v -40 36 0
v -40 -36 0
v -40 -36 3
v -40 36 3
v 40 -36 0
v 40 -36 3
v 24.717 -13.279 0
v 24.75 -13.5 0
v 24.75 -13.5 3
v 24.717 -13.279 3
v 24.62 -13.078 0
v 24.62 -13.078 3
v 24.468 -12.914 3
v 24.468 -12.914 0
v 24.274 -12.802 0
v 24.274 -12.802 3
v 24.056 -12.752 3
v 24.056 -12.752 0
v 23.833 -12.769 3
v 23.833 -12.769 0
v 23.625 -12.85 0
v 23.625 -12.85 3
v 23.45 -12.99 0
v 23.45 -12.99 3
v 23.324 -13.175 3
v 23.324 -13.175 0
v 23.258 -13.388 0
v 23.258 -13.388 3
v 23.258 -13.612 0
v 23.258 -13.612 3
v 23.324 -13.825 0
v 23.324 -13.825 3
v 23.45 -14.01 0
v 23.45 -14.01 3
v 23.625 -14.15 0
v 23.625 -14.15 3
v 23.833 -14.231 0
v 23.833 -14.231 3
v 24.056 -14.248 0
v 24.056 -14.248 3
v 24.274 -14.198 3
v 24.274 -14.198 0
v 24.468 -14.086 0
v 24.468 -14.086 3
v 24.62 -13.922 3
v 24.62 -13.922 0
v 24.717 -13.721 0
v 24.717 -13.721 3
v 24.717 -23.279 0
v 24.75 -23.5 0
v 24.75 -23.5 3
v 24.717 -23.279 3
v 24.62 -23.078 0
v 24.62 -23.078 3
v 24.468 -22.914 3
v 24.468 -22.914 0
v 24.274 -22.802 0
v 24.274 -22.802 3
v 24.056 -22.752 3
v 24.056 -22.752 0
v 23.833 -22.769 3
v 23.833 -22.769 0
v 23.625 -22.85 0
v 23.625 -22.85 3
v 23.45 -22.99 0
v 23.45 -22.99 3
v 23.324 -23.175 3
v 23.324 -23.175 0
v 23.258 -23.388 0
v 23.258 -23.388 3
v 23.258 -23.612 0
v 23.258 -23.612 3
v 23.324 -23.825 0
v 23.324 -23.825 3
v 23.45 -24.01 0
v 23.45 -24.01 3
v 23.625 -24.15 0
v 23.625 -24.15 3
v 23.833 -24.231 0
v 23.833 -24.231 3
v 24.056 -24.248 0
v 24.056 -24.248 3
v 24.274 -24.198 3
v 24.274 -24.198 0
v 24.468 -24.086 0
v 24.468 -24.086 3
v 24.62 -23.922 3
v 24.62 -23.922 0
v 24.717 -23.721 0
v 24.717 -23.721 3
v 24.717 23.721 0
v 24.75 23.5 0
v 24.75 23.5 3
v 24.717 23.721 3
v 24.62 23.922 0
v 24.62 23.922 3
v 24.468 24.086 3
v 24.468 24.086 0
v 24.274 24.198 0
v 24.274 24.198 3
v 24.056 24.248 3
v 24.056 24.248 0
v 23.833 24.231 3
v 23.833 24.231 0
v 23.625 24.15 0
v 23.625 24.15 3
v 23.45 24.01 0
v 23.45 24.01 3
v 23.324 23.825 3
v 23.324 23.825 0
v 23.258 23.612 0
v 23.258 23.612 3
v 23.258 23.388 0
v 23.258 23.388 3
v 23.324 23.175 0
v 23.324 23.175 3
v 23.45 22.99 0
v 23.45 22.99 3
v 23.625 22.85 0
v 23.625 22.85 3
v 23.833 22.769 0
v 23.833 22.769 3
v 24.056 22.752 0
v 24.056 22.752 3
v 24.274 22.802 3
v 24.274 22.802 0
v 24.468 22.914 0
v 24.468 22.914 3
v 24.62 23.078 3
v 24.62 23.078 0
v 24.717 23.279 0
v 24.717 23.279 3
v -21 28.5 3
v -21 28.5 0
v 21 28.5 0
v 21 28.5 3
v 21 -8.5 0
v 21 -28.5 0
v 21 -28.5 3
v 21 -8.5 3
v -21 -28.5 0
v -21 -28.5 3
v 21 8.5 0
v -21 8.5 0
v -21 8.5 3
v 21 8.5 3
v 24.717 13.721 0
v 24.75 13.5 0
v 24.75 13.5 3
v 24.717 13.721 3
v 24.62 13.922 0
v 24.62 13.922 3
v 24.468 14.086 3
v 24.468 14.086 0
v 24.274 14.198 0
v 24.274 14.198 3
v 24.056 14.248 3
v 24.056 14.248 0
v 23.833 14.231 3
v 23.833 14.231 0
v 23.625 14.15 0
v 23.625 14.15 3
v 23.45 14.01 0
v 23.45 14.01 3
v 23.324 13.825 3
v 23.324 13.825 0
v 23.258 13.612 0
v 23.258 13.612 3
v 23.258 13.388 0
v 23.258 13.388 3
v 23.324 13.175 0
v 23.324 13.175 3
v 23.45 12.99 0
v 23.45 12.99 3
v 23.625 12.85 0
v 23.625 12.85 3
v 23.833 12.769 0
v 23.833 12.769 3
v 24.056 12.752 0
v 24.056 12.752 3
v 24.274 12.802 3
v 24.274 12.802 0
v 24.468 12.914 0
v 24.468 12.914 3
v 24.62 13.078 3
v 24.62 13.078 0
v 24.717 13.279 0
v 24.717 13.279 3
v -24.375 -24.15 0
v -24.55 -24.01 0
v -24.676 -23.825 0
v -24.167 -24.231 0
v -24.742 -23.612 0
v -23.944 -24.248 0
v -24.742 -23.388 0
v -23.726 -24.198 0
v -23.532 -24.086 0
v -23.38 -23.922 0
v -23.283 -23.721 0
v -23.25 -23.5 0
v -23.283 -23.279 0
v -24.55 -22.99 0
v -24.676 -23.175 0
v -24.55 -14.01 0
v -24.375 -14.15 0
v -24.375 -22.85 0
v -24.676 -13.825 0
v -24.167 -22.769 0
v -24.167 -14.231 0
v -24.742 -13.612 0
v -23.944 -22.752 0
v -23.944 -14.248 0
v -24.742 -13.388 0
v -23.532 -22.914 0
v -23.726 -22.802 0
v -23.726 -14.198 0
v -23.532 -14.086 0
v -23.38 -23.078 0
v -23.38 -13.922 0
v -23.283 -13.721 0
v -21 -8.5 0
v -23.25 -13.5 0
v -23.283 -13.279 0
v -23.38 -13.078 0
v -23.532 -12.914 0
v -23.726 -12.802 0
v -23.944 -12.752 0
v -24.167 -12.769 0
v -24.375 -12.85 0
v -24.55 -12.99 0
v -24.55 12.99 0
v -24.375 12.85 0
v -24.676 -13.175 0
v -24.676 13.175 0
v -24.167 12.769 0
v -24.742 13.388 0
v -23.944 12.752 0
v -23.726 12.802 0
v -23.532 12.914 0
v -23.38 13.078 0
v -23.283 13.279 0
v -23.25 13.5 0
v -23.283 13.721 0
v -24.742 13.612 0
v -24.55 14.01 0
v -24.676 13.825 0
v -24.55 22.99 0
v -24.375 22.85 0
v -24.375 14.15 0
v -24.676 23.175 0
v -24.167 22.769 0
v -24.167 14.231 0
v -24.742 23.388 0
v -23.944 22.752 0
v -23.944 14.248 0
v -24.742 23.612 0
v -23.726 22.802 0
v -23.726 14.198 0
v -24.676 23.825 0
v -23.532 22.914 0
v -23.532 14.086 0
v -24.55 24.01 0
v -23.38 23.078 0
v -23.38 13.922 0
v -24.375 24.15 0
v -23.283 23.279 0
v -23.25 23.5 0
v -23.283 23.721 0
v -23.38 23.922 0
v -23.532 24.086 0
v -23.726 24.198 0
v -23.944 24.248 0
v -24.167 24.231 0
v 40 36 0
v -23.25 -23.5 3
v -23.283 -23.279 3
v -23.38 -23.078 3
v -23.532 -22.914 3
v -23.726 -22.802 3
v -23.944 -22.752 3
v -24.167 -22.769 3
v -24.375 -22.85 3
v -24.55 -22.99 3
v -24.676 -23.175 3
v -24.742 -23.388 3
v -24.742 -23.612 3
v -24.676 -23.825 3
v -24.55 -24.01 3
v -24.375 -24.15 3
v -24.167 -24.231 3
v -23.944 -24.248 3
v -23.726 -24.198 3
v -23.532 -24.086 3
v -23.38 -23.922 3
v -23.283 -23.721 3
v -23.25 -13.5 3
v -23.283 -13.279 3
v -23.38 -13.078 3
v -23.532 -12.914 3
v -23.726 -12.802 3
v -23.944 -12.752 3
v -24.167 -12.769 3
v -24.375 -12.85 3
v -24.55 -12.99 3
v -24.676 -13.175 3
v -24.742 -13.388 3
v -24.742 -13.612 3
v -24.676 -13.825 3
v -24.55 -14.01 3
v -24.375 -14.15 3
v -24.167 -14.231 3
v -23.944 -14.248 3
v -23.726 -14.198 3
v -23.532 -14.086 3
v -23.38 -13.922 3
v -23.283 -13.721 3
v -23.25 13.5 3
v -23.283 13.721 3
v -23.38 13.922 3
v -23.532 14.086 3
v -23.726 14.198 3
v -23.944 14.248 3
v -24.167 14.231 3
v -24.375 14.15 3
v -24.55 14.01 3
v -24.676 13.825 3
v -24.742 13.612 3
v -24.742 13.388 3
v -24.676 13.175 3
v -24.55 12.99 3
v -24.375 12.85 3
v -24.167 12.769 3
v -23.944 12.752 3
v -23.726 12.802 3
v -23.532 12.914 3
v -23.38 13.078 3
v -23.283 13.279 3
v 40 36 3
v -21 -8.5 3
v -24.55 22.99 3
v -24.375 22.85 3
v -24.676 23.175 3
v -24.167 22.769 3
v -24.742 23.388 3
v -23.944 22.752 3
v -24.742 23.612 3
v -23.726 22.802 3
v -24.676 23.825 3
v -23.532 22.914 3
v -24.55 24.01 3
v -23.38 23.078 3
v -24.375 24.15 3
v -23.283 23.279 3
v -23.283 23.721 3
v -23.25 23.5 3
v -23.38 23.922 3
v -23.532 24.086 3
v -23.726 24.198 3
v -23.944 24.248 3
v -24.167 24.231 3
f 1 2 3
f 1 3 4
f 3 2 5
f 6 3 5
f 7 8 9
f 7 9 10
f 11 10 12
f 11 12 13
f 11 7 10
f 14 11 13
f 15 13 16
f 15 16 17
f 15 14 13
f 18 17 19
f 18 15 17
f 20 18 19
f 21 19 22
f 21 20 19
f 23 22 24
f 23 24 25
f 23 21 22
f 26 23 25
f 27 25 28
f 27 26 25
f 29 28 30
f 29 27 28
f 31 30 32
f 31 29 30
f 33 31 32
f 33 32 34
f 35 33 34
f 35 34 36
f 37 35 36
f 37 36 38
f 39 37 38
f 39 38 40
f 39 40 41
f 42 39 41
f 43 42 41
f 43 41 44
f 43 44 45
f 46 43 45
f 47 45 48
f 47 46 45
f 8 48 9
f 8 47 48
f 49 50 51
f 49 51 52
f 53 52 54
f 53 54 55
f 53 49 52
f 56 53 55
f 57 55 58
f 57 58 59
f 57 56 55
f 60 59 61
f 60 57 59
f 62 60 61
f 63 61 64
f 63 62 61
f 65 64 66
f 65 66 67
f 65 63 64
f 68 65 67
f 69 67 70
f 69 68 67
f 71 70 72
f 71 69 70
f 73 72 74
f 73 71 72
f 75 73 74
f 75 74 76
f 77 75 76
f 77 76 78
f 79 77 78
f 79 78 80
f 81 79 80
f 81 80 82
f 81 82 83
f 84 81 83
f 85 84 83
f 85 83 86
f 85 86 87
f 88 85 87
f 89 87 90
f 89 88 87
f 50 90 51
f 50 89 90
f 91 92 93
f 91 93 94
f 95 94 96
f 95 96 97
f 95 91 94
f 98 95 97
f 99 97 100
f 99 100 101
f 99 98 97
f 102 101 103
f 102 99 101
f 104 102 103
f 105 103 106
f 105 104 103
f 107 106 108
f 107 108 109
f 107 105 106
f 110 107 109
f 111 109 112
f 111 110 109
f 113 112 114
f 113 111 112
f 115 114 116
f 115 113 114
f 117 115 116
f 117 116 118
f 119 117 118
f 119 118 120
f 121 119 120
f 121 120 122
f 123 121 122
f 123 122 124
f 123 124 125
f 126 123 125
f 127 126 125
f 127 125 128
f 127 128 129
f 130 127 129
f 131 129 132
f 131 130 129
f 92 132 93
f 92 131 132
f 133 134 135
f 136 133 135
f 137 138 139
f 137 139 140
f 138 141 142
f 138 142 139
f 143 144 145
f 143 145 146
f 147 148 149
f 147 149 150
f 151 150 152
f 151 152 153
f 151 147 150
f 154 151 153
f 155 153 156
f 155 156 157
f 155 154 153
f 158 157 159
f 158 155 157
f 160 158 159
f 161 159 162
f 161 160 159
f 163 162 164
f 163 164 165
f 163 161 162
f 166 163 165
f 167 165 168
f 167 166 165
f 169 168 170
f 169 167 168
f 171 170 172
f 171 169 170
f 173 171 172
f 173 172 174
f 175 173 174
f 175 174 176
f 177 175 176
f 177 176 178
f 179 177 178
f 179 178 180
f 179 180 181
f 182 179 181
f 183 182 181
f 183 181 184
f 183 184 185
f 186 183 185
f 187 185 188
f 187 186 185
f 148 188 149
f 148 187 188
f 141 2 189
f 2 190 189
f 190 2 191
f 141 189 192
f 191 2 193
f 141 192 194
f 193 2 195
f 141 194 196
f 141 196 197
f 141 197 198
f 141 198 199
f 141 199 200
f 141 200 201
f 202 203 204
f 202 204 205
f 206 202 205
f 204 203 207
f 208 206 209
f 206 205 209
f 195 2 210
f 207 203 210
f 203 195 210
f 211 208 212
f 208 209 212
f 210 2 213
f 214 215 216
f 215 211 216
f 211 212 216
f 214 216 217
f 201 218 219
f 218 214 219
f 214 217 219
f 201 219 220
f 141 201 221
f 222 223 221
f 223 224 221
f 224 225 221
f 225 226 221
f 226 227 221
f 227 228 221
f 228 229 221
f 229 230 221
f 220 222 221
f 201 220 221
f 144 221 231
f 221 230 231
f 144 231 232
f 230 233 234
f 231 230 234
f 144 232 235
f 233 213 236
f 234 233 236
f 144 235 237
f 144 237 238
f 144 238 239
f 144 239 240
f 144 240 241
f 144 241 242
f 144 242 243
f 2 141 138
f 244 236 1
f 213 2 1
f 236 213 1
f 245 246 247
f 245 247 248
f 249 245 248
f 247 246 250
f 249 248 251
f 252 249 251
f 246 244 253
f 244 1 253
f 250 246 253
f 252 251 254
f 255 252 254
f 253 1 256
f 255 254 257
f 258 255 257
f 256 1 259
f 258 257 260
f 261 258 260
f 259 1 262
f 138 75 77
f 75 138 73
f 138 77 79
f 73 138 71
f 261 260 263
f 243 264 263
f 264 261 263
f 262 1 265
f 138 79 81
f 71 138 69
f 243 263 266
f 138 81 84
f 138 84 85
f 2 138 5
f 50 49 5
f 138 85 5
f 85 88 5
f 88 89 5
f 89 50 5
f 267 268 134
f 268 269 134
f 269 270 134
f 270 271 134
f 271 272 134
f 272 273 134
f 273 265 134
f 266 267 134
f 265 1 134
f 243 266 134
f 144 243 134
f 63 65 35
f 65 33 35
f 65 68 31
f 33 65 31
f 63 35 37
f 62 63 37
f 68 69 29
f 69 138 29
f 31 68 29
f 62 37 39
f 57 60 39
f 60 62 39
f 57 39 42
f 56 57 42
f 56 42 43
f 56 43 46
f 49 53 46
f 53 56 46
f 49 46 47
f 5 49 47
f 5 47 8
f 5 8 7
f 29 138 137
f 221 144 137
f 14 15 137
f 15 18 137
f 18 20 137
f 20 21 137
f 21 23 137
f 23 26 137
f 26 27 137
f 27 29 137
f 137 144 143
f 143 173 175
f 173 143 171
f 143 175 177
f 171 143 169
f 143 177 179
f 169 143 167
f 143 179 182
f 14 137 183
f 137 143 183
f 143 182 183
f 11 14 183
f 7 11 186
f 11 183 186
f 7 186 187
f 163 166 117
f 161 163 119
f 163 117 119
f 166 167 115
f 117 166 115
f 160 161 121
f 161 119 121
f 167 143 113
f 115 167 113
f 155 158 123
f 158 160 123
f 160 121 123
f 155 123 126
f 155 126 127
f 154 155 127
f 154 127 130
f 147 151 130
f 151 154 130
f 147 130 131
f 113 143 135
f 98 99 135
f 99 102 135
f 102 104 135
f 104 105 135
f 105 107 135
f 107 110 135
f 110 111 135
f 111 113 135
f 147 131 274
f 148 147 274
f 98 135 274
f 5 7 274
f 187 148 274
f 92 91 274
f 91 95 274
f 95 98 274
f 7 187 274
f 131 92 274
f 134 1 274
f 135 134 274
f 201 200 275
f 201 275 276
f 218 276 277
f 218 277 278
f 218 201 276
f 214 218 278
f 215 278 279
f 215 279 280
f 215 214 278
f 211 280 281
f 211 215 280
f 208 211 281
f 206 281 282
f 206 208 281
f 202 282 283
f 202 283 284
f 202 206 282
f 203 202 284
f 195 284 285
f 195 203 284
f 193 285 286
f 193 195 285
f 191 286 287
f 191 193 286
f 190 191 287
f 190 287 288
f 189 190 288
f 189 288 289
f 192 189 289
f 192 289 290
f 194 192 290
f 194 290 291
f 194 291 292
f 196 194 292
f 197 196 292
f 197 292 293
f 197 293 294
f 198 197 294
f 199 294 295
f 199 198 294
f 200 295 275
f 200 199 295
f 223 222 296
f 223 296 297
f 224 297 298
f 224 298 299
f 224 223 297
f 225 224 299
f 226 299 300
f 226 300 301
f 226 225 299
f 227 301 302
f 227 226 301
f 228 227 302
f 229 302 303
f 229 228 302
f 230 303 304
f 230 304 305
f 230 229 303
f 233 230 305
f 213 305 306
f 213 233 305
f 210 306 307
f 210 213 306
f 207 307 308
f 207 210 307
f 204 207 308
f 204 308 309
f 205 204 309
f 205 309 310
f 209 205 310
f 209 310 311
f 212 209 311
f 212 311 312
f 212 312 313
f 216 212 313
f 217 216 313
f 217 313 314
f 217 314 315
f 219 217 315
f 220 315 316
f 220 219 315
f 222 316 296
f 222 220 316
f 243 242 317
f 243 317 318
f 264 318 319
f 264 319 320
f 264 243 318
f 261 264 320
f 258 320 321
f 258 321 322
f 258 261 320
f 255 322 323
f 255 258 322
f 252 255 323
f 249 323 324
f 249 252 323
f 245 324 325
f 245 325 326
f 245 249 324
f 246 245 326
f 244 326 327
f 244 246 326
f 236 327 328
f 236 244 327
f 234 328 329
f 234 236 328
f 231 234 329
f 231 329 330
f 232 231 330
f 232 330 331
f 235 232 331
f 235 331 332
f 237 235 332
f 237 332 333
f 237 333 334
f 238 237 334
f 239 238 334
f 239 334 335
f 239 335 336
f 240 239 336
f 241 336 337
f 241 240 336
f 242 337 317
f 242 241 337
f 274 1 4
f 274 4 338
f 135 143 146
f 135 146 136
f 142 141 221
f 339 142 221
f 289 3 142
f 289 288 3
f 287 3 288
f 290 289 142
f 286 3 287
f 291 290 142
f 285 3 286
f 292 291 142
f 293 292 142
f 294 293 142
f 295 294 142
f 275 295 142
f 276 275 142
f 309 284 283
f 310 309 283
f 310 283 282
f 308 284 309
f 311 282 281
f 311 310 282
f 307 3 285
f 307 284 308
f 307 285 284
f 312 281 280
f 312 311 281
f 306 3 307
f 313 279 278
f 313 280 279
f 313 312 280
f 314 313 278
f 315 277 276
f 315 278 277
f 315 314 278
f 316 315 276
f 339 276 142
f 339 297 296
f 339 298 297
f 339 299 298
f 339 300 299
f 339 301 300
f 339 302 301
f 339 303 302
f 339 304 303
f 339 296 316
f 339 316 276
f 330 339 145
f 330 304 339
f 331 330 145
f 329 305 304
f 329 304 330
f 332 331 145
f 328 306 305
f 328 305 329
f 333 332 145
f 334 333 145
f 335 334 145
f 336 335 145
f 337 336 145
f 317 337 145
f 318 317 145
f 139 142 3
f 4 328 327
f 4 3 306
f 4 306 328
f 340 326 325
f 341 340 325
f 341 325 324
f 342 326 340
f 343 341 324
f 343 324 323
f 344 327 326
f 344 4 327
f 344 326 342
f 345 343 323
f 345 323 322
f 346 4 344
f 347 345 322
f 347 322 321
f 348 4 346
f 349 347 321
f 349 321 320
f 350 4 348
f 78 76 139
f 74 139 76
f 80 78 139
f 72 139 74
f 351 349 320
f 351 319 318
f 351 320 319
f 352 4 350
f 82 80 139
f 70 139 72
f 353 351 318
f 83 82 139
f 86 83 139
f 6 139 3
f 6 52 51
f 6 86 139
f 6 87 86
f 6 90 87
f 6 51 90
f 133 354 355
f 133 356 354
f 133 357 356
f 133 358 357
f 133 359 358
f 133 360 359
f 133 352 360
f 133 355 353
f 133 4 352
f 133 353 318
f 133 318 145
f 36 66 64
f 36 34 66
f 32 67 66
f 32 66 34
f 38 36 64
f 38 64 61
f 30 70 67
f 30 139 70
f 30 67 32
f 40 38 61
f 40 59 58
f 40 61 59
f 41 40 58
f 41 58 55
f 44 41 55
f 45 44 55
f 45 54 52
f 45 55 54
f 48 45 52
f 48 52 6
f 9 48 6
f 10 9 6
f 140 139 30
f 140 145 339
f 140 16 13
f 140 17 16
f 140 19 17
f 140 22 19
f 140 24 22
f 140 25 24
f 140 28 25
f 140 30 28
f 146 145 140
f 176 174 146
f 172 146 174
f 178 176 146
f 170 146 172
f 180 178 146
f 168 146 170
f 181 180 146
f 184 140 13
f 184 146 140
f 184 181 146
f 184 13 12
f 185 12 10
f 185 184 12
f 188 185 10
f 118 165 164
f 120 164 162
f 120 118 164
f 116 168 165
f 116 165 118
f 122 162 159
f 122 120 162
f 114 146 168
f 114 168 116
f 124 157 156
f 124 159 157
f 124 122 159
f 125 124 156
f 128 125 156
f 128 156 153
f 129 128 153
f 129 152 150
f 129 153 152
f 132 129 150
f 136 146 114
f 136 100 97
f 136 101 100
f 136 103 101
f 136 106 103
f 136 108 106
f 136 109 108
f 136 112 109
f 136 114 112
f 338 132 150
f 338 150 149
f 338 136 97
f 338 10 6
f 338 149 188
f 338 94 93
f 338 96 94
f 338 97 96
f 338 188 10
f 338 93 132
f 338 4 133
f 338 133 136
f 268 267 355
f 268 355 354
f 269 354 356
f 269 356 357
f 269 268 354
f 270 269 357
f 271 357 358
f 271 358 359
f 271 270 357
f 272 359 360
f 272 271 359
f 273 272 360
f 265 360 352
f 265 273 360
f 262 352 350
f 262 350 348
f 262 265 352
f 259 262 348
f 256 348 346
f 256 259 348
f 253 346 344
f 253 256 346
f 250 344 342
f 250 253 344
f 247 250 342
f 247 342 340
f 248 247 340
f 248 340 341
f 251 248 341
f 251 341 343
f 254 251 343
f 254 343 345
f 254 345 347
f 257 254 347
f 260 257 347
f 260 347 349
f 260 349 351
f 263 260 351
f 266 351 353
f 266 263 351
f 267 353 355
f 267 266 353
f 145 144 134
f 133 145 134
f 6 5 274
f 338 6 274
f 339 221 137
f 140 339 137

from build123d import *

# Parameters (mm, degrees)
F0_W     = 80
F0_H     = 72
F0_R     = 0.75
F0_W_2   = 42
F0_H_2   = 20
F1_DEPTH = 3


with BuildPart() as f1:
    # F0 (on Top) → F1 (new body)
    with BuildSketch(Plane.XY):
        Rectangle(F0_W, F0_H)
        with Locations((-24, -23.5)):
            Circle(F0_R, mode=Mode.SUBTRACT)
        with Locations((-24, -13.5)):
            Circle(F0_R, mode=Mode.SUBTRACT)
        with Locations((0, -18.5)):
            Rectangle(F0_W_2, F0_H_2, mode=Mode.SUBTRACT)
        with Locations((24, -23.5)):
            Circle(F0_R, mode=Mode.SUBTRACT)
        with Locations((24, -13.5)):
            Circle(F0_R, mode=Mode.SUBTRACT)
        with Locations((-24, 13.5)):
            Circle(F0_R, mode=Mode.SUBTRACT)
        with Locations((-24, 23.5)):
            Circle(F0_R, mode=Mode.SUBTRACT)
        with Locations((24, 13.5)):
            Circle(F0_R, mode=Mode.SUBTRACT)
        with Locations((0, 18.5)):
            Rectangle(F0_W_2, F0_H_2, mode=Mode.SUBTRACT)
        with Locations((24, 23.5)):
            Circle(F0_R, mode=Mode.SUBTRACT)
    extrude(amount=F1_DEPTH)


solid = f1.part
